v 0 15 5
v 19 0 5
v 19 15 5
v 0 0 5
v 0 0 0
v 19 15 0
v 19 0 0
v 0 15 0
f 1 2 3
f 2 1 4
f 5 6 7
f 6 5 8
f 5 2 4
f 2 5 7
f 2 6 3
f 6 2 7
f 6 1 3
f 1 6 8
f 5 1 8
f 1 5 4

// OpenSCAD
// Generated by SolidPython 1.0.1 on 2020-07-29 00:46:56


cube(size = [19, 15, 5]);
/***********************************************
*********      SolidPython code:      **********
************************************************
 
# import packages: SolidPython
from solid import *
from solid.utils import *
from itertools import chain, combinations, permutations


class Resize:

    def __init__(self, scad_file):
        self.scad_file = scad_file
        #self.scad_file = import_scad(scad_file)
        # cone/cylinder param:
        self.r1 = 0
        self.r2 = 0
        self.h = 0
        # rectangular prism param:
        self.w = 0
        self.l = 0
        # ellipse param:
        self.r = 0

    # import OpenScad code (file name corresponds to shape)


    # classify shape + parameters
    def assign(self, param1, param2, param3):
        if self.scad_file == 'cone.scad':
            self.r1 = param1
            self.r2 = param2
            self.h = param3
        elif self.scad_file == 'cylinder.scad':
            self.r1 = param1
            self.r2 = param2
            self.h = param3
        elif self.scad_file == 'rectangularPrism.scad':
            self.h = param1
            self.l = param2
            self.w = param3
        else:
            self.r = param1
            self.h = param2

    # resize parameters
    def iterate(self):
        x = range(3, 20, 2)
        i = 1
        if self.scad_file == 'cone.scad':
            tempList = list(permutations(x, 2))
            for temp in tempList:
                param1 = temp[0]
                param2 = temp[1]
                filepath = 'produced_scad_files/' + 'cone' + str(param1) + '_' + str(param2) + '_' + '.scad'
                scad_render_to_file(cylinder(h=param1, r1=param2, r2=0), filepath)

        elif self.scad_file == 'cylinder.scad':
            tempList = list(permutations(x, 3))
            for temp in tempList:
                param1 = temp[0]
                param2 = temp[1]
                filepath = 'produced_scad_files/' + 'cylinder' + str(param1) + '_' + str(param2) + '_' + '.scad'
                scad_render_to_file(cylinder(h=param1, r1=param2, r2=param2), filepath)

        elif self.scad_file == 'rectangularPrism.scad':
            tempList = list(permutations(x, 3))
            for temp in tempList:
                param1 = temp[0]
                param2 = temp[1]
                param3 = temp[2]
                filepath = 'produced_scad_files/' + 'rectangularPrism' + str(param1) + '_' + str(param2) + '_' + str(
                    param3) + '.scad'
                scad_render_to_file(cube(size=(param1, param2, param3)), filepath)

        elif self.scad_file == 'ellipse.scad':
            tempList = list(permutations(x, 4))
            for temp in tempList:
                param1 = temp[0]
                param2 = temp[1]
                param3 = temp[2]
                param4 = temp[3]
                filepath = 'produced_scad_files/' + 'ellipse' + str(param1) + '_' + str(param2) + '_' + str(param3) + '_' + str(param4) + '.scad'
                scad_render_to_file(scale([param1, param2, param3])(sphere(r=param4)), filepath)

    def render_to_scadfile(self):
        scad_render_to_file(scad, 'example.scad') 
 
************************************************/
